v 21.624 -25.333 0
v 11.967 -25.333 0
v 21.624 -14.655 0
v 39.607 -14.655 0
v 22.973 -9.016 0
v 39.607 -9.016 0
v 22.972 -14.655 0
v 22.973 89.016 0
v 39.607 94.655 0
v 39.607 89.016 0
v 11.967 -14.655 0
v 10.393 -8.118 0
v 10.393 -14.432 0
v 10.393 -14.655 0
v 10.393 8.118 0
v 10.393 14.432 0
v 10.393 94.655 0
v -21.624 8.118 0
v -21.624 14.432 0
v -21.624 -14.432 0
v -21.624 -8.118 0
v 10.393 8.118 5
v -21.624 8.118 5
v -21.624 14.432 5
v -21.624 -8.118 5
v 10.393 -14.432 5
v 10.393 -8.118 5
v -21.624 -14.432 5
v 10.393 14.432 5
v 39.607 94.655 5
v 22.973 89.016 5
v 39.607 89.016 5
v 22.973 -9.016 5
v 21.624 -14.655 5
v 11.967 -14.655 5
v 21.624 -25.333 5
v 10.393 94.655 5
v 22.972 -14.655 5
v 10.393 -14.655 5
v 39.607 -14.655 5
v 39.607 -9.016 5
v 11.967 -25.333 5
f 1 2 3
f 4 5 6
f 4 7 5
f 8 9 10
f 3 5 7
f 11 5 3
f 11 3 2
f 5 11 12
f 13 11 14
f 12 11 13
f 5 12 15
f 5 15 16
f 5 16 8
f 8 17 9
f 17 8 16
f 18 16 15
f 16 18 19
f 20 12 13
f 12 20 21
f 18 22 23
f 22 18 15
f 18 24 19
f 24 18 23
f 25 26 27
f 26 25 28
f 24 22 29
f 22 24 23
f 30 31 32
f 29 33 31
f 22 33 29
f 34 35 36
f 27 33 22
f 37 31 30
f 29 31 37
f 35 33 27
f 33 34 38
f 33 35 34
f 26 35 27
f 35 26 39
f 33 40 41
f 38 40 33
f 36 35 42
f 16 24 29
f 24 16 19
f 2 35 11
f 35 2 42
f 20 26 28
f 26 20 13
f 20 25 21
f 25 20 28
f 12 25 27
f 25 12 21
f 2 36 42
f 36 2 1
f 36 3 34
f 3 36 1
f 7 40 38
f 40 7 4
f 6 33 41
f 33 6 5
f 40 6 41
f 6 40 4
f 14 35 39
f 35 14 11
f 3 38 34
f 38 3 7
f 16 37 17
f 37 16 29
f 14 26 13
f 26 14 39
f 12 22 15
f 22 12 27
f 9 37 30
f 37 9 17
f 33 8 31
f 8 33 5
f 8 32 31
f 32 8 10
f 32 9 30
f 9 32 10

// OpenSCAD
fudge = 0.1;

HEIGHT = 5;

color("orange")
bed_holder(HEIGHT);
translate([25,40,0])
color("green")
lamp_holder(HEIGHT);

module poly_rect38059(h)
{
  scale([25.4/90, -25.4/90, 1]) union()
  {
    linear_extrude(height=h)
      polygon([[-21.402370,-14.284470],[11.844033,-14.284470],[11.844033,-8.034546],[-21.402370,-8.034546]]);
  }
}

module poly_rect380597(h)
{
  scale([25.4/90, -25.4/90, 1]) union()
  {
    linear_extrude(height=h)
      polygon([[-21.402370,8.034553],[11.844033,8.034553],[11.844033,14.284477],[-21.402370,14.284477]]);
  }
}

module poly_rect3822(h)
{
  scale([25.4/90, -25.4/90, 1]) union()
  {
    linear_extrude(height=h)
      polygon([[11.844030,-25.073326],[21.402370,-25.073326],[21.402370,25.073326],[11.844030,25.073326]]);
  }
}

module poly_rect37817(h)
{
  scale([25.4/90, -25.4/90, 1]) union()
  {
    linear_extrude(height=h)
      polygon([[-2.006730,48.513471],[14.457087,48.513471],[14.457087,54.094666],[-2.006730,54.094666]]);
  }
}

module poly_rect3779(h)
{
  scale([25.4/90, -25.4/90, 1]) union()
  {
    linear_extrude(height=h)
      polygon([[-14.457087,-54.094666],[-2.006729,-54.094666],[-2.006729,54.094657],[-14.457087,54.094657]]);
  }
}

module poly_rect3781(h)
{
  scale([25.4/90, -25.4/90, 1]) union()
  {
    linear_extrude(height=h)
      polygon([[-2.006730,-54.094666],[14.457087,-54.094666],[14.457087,-48.513471],[-2.006730,-48.513471]]);
  }
}

module bed_holder(height){
    SCALE = 3.58;    
    scale([SCALE,SCALE,height])
    union() {
        poly_rect38059(1);
        poly_rect380597(1);
        poly_rect3822(1);    
    }
}

module lamp_holder(height){
    SCALE = 3.58;    
    scale([SCALE,SCALE,height])
    union() {    
        poly_rect37817(1);
        poly_rect3779(1);
        poly_rect3781(1);      
    }        
}
